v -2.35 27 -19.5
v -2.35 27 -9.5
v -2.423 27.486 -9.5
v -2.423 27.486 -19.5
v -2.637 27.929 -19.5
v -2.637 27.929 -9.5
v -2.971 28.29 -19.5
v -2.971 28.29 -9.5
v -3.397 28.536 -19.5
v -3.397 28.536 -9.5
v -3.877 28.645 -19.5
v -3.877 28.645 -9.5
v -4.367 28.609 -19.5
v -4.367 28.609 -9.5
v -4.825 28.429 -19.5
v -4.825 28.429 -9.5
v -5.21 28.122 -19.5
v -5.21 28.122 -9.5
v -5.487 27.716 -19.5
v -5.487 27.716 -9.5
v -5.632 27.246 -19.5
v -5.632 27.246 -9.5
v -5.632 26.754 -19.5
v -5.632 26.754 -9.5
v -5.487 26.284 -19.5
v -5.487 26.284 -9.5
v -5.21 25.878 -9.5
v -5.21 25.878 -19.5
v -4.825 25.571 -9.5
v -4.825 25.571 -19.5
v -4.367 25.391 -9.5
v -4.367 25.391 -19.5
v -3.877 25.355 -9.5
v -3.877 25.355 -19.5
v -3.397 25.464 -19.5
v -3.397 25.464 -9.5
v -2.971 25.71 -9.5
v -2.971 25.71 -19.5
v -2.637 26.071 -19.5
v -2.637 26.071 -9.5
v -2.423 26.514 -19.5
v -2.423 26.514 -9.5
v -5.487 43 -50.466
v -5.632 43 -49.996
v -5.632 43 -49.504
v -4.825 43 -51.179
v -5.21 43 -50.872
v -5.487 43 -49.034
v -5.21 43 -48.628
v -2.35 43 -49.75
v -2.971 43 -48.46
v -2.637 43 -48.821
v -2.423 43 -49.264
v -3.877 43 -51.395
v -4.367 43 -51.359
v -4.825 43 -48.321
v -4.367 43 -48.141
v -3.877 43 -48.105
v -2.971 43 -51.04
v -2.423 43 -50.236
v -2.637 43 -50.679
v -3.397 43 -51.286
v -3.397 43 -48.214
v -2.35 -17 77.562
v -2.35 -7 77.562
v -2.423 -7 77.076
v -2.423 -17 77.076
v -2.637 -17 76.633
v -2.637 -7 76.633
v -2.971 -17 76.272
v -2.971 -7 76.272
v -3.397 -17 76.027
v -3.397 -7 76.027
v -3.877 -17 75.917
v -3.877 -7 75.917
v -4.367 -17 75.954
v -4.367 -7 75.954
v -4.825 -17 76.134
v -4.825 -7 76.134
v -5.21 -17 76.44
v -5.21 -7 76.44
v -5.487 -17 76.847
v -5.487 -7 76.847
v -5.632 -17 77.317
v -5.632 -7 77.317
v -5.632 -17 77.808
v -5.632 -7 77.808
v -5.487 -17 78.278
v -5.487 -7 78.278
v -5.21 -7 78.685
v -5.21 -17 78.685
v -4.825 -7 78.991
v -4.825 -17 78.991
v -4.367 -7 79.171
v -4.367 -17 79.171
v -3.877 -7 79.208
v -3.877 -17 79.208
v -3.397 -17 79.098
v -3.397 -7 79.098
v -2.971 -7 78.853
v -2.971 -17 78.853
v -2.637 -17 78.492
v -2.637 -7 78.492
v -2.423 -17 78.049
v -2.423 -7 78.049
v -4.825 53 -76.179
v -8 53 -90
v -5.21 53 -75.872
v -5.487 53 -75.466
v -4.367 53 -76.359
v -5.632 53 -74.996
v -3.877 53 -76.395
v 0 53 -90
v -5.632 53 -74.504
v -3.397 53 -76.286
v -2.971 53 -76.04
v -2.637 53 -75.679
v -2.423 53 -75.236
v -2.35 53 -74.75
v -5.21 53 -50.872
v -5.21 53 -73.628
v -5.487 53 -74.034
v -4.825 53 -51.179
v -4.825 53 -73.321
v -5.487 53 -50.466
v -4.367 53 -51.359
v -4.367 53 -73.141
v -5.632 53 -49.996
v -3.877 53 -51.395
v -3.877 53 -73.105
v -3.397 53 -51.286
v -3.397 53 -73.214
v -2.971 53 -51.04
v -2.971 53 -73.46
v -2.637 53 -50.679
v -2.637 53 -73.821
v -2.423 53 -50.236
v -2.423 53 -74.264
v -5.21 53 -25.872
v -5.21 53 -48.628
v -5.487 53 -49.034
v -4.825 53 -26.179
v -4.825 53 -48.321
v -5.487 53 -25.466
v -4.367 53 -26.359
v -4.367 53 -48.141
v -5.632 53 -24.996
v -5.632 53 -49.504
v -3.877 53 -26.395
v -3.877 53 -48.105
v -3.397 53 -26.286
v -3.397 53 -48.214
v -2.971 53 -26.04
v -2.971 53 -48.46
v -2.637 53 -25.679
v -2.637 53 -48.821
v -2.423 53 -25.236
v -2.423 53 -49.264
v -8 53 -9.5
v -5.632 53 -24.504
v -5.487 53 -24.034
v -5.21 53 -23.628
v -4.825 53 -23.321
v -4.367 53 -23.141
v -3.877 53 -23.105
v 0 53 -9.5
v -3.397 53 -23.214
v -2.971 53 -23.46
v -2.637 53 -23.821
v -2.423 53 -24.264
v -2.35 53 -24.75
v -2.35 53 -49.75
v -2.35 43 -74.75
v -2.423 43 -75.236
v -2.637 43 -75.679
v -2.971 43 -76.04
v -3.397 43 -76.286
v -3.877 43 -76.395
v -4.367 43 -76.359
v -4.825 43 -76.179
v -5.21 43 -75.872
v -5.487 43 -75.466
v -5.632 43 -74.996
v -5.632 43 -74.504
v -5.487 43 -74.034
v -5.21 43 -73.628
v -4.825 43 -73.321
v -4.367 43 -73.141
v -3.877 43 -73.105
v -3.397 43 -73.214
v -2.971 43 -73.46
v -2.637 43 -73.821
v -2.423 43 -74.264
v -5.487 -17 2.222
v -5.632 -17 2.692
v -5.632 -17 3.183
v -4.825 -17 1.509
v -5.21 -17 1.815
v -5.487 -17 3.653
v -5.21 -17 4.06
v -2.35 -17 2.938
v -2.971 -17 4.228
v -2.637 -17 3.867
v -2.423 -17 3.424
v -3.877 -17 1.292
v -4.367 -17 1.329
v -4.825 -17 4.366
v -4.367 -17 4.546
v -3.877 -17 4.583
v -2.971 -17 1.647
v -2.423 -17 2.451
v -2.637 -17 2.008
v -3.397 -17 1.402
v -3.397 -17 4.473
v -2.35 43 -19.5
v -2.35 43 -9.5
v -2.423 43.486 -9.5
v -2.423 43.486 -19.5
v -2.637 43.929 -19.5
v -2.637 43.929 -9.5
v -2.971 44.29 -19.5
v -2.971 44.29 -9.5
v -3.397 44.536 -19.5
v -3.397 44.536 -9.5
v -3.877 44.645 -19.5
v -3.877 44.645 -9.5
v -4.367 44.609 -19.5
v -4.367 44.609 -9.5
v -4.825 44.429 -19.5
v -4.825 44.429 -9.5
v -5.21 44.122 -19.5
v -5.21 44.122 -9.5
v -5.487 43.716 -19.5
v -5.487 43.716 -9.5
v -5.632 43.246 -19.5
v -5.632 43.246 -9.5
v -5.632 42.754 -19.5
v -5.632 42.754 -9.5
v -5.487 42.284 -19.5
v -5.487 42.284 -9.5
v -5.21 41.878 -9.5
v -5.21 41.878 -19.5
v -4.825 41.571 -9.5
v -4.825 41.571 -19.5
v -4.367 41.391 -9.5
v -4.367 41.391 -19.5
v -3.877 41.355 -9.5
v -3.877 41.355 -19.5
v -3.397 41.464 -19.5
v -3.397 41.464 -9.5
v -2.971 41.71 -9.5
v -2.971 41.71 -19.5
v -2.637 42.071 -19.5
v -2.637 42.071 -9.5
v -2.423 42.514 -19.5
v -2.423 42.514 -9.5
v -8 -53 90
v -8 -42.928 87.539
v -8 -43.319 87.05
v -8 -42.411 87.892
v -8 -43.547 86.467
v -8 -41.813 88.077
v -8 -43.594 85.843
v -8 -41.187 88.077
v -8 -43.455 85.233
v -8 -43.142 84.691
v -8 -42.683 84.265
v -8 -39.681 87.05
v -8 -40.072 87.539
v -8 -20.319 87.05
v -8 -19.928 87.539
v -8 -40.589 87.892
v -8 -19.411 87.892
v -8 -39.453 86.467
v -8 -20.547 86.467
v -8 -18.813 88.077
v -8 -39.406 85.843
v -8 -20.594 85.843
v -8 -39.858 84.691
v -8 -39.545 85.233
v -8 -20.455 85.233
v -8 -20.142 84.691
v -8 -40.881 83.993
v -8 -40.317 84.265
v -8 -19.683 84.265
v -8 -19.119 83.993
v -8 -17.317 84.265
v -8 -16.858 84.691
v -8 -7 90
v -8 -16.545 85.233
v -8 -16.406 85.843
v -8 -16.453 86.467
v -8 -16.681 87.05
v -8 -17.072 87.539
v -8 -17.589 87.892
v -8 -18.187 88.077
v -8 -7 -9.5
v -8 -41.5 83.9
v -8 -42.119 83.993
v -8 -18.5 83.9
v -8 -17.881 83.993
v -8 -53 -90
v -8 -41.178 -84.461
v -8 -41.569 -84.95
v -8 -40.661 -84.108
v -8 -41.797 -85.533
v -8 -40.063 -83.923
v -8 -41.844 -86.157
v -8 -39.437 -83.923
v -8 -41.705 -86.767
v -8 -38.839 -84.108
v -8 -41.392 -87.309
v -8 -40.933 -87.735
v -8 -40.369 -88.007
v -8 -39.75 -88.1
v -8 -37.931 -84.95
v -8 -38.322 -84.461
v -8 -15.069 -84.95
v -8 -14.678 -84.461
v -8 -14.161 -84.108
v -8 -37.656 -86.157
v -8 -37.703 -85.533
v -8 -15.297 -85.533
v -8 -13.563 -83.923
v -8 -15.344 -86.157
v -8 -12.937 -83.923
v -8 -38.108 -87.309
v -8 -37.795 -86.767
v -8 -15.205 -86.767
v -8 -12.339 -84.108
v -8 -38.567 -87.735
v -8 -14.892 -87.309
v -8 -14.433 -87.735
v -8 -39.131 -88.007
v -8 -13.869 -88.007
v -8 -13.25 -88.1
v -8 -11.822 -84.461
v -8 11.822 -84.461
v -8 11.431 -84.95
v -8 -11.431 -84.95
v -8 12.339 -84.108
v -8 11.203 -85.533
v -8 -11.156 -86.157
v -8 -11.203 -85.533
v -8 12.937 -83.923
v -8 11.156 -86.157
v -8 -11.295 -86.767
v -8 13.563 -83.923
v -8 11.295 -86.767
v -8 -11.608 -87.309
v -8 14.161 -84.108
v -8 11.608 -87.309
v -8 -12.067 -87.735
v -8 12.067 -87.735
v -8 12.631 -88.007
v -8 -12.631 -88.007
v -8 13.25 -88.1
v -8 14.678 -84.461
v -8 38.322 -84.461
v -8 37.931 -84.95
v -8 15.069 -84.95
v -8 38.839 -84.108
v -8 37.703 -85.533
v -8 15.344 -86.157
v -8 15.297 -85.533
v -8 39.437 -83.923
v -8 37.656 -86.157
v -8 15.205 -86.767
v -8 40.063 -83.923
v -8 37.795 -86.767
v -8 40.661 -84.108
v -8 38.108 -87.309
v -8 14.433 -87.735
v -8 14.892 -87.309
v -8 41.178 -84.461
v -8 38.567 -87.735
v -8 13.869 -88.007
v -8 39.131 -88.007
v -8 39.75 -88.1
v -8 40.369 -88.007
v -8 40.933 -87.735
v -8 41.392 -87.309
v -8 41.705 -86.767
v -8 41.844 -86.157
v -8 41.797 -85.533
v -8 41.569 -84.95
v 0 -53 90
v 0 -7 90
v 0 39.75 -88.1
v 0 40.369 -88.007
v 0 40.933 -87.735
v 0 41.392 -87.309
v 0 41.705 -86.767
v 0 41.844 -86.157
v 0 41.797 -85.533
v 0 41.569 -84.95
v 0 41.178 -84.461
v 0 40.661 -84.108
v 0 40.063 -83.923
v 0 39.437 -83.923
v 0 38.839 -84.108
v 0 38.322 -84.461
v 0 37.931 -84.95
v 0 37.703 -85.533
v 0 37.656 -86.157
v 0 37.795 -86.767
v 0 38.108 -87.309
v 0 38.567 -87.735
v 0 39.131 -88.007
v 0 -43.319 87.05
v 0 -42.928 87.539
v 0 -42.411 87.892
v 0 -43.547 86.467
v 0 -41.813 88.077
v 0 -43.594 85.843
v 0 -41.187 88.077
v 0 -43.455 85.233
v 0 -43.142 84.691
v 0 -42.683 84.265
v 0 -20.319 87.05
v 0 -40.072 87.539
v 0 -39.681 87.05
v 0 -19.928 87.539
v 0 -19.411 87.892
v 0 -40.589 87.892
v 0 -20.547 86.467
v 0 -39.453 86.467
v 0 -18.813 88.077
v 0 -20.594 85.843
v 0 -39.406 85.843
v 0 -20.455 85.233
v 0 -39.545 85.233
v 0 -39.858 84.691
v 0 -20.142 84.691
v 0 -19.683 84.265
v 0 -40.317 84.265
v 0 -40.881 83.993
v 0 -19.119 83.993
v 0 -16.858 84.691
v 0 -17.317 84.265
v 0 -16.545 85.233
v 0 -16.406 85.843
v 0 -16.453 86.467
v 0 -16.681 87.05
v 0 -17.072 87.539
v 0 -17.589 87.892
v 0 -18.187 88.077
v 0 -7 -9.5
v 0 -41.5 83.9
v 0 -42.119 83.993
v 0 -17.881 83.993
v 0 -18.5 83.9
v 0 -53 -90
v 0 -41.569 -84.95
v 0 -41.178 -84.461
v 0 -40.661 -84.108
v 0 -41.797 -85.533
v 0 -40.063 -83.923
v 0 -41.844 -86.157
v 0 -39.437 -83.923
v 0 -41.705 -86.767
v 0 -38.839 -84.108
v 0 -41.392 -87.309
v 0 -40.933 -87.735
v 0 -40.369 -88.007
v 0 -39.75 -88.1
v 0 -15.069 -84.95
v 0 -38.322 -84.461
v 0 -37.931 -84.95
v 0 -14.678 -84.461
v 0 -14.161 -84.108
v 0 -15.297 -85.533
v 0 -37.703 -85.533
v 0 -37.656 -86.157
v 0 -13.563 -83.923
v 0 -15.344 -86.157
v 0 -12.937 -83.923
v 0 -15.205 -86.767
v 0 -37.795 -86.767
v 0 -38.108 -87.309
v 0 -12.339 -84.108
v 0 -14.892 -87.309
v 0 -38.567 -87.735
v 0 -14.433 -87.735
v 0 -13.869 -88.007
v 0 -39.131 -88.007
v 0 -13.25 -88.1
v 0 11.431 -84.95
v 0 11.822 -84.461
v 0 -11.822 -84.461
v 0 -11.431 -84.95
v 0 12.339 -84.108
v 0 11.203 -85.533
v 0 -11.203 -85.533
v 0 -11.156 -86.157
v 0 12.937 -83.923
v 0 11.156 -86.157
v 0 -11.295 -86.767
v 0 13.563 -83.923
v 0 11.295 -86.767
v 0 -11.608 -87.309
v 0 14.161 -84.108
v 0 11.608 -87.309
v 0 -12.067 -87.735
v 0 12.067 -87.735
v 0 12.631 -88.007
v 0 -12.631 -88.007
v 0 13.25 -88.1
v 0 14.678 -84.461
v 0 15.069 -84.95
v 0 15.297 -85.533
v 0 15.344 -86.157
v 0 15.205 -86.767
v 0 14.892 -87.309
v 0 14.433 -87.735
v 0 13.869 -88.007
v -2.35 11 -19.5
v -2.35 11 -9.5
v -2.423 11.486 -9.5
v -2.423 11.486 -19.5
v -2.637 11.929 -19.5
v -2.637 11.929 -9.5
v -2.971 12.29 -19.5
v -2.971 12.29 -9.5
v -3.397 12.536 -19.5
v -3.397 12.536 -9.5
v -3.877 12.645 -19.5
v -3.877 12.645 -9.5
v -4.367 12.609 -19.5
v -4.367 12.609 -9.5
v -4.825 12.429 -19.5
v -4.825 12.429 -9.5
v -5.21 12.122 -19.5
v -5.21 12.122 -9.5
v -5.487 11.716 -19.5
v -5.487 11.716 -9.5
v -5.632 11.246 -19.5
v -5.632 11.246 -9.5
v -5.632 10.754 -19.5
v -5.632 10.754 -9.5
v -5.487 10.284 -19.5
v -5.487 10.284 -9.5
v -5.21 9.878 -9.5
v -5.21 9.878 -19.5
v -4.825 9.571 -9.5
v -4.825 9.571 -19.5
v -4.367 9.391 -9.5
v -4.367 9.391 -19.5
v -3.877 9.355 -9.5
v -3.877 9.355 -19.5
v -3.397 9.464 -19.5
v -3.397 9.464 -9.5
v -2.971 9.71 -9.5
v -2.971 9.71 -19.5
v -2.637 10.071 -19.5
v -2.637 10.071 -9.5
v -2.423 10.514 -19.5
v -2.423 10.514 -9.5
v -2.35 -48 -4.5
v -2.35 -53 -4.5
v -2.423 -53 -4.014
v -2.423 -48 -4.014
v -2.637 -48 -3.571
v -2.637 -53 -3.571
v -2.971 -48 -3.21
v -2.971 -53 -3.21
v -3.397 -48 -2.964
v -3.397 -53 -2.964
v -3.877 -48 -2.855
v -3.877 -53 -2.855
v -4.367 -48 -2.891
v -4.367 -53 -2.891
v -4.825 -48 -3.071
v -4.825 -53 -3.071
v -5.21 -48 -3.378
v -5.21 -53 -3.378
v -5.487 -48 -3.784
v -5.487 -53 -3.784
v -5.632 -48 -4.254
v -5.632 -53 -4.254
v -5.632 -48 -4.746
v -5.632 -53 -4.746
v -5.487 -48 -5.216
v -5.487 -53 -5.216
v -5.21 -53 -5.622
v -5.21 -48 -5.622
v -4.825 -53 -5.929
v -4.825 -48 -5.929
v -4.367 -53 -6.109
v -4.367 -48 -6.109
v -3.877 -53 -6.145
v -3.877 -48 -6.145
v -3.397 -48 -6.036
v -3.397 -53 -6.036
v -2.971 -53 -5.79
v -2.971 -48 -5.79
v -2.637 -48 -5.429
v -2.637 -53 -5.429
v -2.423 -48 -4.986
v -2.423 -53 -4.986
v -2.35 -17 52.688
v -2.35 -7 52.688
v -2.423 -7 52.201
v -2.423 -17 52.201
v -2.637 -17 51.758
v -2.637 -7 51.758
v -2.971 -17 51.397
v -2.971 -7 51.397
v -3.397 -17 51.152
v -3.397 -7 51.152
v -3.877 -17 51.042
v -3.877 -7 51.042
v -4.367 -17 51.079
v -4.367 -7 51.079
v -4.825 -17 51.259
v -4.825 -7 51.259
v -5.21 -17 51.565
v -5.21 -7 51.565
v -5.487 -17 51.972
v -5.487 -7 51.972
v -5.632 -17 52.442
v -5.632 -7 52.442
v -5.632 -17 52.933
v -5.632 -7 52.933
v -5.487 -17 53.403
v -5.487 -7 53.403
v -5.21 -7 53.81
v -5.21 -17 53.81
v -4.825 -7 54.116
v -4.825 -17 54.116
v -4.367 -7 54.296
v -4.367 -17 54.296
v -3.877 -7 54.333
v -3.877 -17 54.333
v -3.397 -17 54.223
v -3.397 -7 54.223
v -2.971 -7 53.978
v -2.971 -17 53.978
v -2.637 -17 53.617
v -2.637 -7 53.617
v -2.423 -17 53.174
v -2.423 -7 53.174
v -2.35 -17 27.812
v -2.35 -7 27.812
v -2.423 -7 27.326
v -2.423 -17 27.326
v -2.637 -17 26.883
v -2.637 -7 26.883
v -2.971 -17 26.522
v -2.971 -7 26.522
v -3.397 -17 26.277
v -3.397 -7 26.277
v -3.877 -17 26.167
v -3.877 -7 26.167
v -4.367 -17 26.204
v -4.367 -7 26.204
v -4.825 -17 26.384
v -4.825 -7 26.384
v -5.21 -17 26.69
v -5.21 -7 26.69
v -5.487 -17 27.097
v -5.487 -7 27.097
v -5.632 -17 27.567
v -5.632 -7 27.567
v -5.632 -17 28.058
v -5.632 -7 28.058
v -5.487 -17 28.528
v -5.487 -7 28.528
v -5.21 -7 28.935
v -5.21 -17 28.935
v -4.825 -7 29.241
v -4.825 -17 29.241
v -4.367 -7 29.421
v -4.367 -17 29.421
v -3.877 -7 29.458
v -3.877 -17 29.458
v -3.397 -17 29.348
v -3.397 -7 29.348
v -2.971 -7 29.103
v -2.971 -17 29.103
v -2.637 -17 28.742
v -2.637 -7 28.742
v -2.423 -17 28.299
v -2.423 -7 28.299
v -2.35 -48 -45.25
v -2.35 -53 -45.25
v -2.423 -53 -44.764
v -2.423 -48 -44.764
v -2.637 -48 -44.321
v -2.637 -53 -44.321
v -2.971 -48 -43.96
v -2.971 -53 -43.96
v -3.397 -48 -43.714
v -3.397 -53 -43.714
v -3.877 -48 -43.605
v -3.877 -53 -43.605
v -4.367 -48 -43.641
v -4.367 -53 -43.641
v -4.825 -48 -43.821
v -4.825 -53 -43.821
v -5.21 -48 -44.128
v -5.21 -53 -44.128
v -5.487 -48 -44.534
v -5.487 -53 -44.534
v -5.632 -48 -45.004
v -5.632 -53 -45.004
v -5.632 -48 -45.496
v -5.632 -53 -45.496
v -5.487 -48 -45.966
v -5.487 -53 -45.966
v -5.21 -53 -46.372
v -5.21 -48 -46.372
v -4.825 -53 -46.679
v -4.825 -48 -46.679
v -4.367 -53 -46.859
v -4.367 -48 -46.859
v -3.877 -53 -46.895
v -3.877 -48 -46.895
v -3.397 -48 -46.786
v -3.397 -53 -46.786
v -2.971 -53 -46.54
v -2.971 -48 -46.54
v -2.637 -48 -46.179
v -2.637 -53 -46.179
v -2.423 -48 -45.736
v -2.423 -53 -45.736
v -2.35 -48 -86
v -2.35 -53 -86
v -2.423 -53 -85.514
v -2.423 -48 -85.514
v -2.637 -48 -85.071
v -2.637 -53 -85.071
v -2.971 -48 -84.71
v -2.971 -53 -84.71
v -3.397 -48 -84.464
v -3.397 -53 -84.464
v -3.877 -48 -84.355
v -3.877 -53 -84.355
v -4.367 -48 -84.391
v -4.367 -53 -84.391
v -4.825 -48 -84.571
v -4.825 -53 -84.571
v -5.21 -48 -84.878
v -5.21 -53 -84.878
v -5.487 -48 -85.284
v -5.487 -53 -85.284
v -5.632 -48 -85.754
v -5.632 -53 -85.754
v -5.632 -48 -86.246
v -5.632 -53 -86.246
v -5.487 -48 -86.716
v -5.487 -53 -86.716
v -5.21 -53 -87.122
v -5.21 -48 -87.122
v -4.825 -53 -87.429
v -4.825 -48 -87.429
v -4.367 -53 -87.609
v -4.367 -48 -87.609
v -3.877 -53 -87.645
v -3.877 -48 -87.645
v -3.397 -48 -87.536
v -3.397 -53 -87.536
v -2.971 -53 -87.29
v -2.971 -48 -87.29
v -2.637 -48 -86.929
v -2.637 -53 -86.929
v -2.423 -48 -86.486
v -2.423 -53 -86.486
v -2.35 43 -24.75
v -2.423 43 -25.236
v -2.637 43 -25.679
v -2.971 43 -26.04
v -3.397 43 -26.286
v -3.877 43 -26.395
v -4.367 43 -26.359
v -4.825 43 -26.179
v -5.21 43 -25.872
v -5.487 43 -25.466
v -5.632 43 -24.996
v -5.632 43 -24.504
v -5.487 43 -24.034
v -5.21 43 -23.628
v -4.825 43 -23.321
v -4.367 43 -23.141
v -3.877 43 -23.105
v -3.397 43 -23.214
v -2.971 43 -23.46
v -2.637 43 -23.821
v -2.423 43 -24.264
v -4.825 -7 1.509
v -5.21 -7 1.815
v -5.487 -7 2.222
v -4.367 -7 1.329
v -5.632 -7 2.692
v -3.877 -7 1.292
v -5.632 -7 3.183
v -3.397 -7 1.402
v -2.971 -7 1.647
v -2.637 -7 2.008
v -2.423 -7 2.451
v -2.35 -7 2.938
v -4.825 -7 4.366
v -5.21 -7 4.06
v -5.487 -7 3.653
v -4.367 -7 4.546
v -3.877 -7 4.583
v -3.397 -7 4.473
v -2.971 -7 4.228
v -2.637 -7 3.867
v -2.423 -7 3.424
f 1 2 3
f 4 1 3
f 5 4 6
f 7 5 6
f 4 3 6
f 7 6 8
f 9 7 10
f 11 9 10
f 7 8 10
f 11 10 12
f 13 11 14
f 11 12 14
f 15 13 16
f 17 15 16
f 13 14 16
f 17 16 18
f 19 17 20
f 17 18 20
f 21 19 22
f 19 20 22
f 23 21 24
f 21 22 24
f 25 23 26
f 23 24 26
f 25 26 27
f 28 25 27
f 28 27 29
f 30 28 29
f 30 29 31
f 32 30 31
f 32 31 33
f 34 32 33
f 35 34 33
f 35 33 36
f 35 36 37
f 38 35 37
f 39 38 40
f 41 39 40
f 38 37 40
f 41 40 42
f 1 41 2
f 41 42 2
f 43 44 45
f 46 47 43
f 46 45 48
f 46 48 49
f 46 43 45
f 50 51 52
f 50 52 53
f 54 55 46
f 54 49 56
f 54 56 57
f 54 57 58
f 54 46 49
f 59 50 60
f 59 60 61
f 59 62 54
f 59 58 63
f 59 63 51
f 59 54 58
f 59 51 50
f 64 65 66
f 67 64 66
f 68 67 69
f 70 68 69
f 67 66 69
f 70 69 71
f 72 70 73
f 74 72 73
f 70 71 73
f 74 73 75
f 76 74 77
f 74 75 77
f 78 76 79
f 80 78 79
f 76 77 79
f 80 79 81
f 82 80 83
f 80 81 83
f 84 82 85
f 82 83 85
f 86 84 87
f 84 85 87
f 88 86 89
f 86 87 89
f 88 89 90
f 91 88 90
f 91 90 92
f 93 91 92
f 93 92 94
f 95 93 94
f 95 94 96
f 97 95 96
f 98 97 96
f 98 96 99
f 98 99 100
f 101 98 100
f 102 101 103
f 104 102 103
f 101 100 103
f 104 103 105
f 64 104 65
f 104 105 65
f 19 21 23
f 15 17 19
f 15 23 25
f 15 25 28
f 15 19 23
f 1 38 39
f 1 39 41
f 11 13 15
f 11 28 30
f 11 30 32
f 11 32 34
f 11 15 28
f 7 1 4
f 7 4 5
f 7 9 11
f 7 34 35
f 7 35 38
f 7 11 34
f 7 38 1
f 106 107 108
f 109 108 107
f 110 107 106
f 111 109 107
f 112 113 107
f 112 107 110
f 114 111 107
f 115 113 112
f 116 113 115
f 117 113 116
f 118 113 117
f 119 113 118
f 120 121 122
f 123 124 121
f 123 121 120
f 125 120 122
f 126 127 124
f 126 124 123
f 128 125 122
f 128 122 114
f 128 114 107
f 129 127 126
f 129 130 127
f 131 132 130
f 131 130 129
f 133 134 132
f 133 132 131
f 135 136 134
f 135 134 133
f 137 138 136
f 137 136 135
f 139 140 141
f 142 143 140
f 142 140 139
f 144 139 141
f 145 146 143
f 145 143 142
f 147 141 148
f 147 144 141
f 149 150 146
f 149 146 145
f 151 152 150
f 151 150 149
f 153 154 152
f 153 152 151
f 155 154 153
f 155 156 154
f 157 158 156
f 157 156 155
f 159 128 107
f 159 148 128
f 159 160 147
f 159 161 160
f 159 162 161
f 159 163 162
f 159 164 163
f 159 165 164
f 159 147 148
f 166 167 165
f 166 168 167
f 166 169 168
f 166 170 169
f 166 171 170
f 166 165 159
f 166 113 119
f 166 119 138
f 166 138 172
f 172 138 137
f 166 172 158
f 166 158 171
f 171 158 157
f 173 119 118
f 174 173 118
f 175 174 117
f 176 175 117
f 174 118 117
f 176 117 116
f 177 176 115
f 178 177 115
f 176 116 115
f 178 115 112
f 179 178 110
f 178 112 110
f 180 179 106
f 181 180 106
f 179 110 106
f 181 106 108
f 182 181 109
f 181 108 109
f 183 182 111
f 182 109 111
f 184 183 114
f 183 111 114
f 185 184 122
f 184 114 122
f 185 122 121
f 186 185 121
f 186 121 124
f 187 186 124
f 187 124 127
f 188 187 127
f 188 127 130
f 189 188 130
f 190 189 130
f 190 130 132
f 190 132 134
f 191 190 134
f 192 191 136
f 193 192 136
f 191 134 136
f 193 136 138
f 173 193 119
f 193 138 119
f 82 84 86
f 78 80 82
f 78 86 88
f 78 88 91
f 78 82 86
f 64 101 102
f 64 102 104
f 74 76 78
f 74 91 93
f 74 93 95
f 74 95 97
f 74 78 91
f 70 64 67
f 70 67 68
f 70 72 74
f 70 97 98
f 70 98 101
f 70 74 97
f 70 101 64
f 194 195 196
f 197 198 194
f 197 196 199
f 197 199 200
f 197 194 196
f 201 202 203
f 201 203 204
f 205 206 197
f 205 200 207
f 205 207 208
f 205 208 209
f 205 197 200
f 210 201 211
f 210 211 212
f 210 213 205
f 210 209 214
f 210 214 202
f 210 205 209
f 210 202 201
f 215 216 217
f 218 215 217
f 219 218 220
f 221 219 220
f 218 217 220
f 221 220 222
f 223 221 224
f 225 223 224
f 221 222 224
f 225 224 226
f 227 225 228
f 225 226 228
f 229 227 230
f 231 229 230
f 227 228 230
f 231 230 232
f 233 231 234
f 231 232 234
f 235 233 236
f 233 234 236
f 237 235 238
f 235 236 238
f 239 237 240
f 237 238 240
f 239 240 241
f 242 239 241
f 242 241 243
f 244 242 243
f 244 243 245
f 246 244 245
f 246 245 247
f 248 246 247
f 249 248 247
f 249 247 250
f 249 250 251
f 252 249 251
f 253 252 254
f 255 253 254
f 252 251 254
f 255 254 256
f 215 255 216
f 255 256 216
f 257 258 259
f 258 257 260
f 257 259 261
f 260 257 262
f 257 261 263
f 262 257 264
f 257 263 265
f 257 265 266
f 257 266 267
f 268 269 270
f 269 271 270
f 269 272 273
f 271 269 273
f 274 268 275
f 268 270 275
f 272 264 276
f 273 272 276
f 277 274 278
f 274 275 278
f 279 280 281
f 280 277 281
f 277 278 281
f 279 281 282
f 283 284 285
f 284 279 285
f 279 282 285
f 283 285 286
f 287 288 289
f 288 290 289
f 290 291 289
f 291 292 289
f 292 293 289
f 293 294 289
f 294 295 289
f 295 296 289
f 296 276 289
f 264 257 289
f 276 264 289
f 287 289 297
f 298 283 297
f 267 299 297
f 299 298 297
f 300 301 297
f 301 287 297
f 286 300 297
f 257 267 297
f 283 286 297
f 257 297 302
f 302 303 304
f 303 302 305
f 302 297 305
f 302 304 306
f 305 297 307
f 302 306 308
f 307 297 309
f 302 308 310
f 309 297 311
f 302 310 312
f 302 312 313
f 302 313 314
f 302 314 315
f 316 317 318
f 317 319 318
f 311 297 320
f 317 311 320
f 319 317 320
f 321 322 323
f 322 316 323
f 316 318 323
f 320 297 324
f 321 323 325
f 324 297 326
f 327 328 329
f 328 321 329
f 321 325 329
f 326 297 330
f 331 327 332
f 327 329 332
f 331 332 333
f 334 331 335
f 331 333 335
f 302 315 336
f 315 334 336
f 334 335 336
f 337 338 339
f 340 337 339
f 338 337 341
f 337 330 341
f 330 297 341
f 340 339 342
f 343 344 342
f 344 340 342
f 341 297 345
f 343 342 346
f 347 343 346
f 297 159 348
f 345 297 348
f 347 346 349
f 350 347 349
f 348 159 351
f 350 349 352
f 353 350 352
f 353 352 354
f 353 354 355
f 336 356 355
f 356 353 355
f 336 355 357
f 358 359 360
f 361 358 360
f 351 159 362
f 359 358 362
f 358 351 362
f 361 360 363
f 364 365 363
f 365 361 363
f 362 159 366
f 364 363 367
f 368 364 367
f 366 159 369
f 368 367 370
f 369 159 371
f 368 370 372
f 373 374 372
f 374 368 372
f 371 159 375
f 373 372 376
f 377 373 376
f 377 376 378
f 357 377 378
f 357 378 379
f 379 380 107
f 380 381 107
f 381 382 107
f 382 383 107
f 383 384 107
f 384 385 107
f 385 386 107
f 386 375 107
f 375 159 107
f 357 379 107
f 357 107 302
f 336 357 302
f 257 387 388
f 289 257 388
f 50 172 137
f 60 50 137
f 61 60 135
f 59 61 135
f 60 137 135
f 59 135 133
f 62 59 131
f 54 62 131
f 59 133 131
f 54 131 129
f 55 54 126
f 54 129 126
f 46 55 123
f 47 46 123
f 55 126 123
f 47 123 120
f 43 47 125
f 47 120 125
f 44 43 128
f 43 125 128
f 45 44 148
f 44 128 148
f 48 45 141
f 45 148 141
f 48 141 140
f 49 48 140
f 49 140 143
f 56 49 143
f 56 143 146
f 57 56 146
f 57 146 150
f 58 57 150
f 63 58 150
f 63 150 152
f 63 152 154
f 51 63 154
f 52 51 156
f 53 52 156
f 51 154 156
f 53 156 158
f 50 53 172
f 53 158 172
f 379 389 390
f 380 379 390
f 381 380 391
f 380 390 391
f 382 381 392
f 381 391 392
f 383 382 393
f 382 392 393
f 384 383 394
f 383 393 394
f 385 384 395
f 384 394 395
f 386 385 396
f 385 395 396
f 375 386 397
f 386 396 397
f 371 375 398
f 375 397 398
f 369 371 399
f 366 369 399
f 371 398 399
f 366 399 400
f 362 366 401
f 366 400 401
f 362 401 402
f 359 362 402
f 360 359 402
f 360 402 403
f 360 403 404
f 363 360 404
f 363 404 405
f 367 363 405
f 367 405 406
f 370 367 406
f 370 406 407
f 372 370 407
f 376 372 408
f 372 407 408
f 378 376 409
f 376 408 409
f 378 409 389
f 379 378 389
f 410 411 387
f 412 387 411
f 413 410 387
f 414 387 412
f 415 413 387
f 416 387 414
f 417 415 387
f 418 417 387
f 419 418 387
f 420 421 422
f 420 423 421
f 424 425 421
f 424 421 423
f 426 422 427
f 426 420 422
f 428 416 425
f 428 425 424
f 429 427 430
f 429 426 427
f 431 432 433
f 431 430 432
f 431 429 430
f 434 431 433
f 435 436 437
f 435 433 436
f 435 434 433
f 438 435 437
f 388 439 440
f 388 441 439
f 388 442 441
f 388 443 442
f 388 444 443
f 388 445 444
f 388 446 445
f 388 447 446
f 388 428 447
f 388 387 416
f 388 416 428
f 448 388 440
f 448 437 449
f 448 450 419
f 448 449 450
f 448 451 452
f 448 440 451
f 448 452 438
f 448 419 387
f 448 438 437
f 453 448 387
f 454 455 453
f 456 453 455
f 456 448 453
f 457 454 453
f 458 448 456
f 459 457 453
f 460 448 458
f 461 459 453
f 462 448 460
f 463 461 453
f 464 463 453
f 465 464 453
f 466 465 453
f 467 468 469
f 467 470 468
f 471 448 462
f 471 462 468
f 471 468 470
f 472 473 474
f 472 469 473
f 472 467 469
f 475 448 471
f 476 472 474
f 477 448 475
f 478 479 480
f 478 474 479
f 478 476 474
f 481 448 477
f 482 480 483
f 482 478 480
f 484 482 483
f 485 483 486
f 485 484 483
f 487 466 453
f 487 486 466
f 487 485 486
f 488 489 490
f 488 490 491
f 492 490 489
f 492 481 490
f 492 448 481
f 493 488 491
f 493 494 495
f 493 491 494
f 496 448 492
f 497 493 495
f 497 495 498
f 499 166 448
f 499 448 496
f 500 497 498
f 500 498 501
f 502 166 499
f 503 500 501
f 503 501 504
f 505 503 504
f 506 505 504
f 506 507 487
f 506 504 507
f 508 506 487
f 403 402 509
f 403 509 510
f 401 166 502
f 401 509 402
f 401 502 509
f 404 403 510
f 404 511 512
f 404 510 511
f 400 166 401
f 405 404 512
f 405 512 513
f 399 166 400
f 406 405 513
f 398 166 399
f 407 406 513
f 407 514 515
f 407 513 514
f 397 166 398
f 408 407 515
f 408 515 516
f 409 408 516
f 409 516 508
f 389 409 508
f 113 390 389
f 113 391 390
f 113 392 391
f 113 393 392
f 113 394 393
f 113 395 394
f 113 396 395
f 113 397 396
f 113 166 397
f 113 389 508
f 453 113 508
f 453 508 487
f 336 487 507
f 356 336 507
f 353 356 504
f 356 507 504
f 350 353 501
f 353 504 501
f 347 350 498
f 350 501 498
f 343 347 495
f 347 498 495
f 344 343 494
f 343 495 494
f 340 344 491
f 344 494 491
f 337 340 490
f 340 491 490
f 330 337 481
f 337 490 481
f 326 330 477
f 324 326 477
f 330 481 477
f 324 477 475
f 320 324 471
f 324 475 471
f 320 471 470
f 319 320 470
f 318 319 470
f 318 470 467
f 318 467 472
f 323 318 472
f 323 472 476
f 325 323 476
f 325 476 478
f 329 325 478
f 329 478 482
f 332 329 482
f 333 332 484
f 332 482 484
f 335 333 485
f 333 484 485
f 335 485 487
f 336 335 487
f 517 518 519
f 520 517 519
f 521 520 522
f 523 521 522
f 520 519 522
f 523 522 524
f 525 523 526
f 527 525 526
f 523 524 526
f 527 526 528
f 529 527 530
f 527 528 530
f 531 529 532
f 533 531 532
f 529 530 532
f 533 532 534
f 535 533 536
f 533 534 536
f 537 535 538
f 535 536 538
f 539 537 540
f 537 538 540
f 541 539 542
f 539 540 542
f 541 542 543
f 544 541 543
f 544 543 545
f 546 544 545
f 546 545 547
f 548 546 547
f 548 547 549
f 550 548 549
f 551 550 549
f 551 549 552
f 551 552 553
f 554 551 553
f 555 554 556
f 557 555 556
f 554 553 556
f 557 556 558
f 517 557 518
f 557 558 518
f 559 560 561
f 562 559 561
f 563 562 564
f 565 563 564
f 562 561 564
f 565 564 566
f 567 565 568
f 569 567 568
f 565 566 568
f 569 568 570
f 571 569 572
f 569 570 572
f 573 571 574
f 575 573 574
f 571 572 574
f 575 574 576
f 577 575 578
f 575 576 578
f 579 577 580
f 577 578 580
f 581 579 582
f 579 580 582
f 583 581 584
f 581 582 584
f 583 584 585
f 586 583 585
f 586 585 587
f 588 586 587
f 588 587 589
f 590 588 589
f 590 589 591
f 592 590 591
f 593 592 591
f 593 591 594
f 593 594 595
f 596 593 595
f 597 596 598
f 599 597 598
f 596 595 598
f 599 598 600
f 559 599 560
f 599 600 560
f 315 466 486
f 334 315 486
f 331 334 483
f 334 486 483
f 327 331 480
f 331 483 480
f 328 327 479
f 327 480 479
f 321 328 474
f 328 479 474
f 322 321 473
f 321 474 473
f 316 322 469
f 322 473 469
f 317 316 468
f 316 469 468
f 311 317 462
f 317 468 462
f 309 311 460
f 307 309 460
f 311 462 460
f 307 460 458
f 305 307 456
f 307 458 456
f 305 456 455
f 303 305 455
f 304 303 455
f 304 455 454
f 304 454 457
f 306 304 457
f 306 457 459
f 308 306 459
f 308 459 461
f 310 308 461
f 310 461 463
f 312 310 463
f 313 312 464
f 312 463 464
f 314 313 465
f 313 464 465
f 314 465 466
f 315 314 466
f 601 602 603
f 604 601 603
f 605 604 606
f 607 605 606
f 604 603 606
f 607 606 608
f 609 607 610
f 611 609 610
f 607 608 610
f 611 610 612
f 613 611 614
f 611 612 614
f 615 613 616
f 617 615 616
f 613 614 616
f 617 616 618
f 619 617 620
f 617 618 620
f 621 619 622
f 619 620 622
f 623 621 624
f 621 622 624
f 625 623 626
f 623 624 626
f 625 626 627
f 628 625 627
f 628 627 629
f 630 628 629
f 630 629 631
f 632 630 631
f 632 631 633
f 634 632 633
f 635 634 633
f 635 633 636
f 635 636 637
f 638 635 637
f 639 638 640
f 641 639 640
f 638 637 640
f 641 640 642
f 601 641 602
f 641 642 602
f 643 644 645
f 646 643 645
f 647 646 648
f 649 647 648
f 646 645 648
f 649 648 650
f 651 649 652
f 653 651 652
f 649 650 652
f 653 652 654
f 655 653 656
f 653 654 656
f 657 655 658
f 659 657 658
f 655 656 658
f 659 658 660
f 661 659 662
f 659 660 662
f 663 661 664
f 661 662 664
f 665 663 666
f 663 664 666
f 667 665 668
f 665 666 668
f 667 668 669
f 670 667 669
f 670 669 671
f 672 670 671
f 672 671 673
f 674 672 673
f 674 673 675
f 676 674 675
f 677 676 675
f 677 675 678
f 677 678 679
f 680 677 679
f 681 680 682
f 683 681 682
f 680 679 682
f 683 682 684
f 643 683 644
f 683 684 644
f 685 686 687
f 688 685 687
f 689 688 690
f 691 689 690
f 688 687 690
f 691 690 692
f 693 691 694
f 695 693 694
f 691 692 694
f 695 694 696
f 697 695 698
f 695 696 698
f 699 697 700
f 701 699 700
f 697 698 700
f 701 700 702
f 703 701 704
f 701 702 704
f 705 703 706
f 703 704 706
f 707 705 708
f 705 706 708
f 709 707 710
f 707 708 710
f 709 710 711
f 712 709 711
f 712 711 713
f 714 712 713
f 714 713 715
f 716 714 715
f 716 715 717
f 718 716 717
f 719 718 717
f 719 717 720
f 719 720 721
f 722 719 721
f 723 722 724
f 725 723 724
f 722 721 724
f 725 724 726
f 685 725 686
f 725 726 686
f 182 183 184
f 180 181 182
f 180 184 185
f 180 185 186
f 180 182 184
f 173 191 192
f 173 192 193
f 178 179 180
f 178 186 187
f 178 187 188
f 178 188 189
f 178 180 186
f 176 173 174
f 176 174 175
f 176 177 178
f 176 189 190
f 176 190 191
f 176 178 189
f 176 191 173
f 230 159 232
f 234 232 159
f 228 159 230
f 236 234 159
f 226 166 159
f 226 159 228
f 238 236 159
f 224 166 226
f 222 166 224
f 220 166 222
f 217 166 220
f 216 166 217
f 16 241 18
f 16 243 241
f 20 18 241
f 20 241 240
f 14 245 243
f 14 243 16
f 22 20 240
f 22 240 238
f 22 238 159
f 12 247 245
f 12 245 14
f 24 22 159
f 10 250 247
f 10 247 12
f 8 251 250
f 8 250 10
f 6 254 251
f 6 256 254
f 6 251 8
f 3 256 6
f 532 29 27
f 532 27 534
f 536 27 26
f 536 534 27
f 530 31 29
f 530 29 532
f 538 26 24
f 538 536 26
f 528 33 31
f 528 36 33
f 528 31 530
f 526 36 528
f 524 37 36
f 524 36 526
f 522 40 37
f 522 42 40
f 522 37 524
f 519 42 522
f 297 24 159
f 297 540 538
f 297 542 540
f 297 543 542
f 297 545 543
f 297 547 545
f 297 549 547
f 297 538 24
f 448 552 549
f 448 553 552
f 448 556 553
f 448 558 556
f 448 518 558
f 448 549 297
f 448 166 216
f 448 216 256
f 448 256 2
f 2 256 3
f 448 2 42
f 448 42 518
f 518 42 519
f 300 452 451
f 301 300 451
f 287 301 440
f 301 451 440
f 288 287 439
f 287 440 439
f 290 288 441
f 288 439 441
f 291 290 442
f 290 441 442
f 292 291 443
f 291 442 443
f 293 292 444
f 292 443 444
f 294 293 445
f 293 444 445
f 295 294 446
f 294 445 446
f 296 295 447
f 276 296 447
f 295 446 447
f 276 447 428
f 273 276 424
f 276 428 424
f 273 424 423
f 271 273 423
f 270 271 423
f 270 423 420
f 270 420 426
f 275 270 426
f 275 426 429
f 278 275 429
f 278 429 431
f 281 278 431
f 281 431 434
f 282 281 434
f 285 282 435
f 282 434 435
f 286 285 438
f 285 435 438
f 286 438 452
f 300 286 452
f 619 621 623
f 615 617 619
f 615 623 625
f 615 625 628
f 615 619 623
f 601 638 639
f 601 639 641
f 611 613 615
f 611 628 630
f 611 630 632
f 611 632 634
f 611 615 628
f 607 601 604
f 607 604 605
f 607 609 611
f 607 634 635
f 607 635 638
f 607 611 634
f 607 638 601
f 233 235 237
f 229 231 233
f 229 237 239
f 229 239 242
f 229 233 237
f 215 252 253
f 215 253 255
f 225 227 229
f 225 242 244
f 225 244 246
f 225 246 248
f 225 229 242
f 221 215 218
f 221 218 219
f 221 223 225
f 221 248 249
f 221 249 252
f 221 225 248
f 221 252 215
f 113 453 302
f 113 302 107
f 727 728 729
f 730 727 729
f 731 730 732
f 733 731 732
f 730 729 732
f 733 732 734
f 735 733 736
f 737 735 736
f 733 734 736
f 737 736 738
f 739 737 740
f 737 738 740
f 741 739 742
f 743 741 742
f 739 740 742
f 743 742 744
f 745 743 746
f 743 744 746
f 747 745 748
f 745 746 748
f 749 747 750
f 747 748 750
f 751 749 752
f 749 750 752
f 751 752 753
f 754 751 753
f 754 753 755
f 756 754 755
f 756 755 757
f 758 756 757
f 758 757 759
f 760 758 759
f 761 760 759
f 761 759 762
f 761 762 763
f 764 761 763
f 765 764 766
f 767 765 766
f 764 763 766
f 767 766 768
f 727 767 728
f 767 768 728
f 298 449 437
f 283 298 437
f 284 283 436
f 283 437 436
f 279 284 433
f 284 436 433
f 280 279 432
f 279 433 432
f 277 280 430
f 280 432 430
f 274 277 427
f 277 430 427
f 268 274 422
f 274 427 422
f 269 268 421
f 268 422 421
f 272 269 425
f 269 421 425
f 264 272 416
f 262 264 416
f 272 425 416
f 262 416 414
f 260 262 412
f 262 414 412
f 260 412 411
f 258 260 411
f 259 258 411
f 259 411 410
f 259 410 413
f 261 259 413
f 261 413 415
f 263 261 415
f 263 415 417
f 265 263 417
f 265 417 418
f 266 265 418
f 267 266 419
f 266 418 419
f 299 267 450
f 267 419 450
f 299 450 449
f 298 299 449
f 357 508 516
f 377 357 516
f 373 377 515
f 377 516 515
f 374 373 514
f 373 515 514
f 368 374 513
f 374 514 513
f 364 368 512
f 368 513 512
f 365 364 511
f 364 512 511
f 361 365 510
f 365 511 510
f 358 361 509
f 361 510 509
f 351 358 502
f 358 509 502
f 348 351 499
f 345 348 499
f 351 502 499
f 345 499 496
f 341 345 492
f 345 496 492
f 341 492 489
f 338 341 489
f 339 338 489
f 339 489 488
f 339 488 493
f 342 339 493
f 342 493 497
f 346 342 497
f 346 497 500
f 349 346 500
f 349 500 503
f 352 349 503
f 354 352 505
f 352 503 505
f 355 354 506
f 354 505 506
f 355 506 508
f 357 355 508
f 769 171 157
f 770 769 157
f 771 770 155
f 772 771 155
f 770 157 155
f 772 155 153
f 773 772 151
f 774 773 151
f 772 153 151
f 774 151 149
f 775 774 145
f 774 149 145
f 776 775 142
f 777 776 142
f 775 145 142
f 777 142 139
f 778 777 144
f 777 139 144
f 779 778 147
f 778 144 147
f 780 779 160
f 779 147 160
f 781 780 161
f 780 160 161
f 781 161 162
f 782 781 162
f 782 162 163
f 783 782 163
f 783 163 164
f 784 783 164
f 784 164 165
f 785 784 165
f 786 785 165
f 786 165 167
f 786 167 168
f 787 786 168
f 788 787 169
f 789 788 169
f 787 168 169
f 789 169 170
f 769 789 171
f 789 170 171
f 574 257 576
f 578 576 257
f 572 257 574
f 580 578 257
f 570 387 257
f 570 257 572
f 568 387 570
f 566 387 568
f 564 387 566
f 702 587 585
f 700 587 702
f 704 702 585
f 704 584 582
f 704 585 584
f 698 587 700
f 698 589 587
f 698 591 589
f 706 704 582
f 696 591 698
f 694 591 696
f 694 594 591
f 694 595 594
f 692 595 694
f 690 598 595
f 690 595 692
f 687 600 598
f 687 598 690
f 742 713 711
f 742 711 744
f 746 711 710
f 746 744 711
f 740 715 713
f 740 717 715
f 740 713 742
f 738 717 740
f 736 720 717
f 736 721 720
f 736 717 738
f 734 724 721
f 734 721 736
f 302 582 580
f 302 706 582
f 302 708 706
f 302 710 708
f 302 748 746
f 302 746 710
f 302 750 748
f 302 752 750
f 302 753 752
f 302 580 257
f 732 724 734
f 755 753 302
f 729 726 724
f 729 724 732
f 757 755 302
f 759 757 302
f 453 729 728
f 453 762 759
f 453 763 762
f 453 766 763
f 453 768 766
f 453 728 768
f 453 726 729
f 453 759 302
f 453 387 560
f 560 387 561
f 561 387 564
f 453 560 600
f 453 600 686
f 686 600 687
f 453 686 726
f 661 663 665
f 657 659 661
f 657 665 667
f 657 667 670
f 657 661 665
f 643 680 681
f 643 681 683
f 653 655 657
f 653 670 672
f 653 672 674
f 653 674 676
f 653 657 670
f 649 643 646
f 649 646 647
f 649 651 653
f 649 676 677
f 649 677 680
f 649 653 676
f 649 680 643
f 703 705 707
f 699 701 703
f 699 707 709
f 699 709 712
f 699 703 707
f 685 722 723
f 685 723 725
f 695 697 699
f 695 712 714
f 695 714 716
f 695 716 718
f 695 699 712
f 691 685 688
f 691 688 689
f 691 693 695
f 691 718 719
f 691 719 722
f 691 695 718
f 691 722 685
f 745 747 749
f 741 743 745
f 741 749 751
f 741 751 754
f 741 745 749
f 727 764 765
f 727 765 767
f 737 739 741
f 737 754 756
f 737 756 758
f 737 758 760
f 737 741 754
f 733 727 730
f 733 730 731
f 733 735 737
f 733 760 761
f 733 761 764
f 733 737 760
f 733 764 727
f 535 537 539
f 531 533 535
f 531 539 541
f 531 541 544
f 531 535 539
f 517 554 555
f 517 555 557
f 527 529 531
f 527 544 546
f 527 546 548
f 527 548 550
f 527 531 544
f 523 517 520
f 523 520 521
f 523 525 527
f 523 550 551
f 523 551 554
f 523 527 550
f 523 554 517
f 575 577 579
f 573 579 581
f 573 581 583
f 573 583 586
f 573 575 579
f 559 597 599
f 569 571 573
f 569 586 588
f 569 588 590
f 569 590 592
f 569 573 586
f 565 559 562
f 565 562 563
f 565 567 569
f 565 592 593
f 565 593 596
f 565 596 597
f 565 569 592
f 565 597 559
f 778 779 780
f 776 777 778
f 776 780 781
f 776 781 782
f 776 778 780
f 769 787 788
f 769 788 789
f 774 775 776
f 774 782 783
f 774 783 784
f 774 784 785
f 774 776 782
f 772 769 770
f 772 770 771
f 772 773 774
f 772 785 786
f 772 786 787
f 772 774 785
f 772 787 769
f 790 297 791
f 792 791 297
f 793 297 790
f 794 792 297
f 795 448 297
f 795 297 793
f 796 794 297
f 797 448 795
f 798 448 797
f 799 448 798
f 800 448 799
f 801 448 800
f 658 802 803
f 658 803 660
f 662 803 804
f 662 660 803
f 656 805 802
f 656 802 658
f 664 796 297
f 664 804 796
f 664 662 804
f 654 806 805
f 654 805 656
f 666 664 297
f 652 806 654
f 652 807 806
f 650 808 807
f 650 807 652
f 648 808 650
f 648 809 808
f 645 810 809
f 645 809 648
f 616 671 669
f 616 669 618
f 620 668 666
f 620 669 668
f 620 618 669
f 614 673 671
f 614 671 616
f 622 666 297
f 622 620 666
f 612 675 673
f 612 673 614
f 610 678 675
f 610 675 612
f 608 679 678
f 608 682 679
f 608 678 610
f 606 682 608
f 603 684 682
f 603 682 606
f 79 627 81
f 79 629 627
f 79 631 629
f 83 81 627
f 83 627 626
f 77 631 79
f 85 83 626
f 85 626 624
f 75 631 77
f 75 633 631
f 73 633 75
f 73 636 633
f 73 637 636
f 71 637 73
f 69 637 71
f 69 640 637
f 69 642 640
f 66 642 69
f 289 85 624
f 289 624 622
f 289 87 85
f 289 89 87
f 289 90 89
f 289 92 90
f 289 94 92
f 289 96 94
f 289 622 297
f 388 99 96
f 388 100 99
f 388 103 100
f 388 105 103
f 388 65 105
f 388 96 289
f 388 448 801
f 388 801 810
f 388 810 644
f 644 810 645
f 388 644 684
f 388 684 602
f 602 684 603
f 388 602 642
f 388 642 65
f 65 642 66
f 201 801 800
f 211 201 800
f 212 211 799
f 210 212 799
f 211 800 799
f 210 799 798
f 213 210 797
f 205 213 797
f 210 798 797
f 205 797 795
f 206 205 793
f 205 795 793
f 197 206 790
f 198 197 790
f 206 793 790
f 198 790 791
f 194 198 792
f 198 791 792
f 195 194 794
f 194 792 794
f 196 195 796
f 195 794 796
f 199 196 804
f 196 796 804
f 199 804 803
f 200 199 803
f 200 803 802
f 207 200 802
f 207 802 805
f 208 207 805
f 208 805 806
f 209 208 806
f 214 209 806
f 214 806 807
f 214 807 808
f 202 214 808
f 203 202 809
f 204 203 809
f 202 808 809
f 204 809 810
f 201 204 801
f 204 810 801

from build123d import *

# Parameters (mm, degrees)
SKETCH1_W           = 8
SKETCH1_H           = 46
SKETCH1_R           = 2.1
SKETCH1_H_2         = 106
BOSS_EXTRUDE1_DEPTH = 8
SKETCH2_R           = 1.65
CUT_EXTRUDE1_DEPTH  = 5
SKETCH3_R           = 1.65
CUT_EXTRUDE2_DEPTH  = 10
SKETCH4_R           = 1.65
CUT_EXTRUDE3_DEPTH  = 10
SKETCH5_R           = 1.65
CUT_EXTRUDE4_DEPTH  = 10


with BuildPart() as part:
    # Sketch1 → Boss-Extrude1 (new body)
    with BuildSketch(Plane(origin=(0, 0, 0), x_dir=(0, 0, -1), z_dir=(1, 0, 0))):
        with Locations((-86, -30)):
            Rectangle(SKETCH1_W, SKETCH1_H)
        with Locations((-86, -41.5)):
            Circle(SKETCH1_R, mode=Mode.SUBTRACT)
        with Locations((-86, -18.5)):
            Circle(SKETCH1_R, mode=Mode.SUBTRACT)
        Polygon((82, 53), (9.5, 53), (9.5, -7), (-82, -7), (-82, -53), (82, -53), align=None)
        with Locations((86, 0)):
            Rectangle(SKETCH1_W, SKETCH1_H_2)
        with Locations((86, -39.75)):
            Circle(SKETCH1_R, mode=Mode.SUBTRACT)
        with Locations((86, -13.25)):
            Circle(SKETCH1_R, mode=Mode.SUBTRACT)
        with Locations((86, 13.25)):
            Circle(SKETCH1_R, mode=Mode.SUBTRACT)
        with Locations((86, 39.75)):
            Circle(SKETCH1_R, mode=Mode.SUBTRACT)
    extrude(amount=-BOSS_EXTRUDE1_DEPTH)

    # Sketch2 → Cut-Extrude1 (cut)
    with BuildSketch(Plane.XZ.offset(53)):
        with Locations((-4, -86)):
            Circle(SKETCH2_R)
        with Locations((-4, -4.5)):
            Circle(SKETCH2_R)
        with Locations((-4, -45.25)):
            Circle(SKETCH2_R)
    extrude(amount=-CUT_EXTRUDE1_DEPTH, mode=Mode.SUBTRACT)

    # Sketch3 → Cut-Extrude2 (cut)
    with BuildSketch(Plane(origin=(0, 53, 0), x_dir=(1, 0, 0), z_dir=(0, 1, 0))):
        with Locations((-4, 49.75)):
            Circle(SKETCH3_R)
        with Locations((-4, 74.75)):
            Circle(SKETCH3_R)
        with Locations((-4, 24.75)):
            Circle(SKETCH3_R)
    extrude(amount=-CUT_EXTRUDE2_DEPTH, mode=Mode.SUBTRACT)

    # Sketch4 → Cut-Extrude3 (cut)
    with BuildSketch(Plane(origin=(0, -7, 0), x_dir=(1, 0, 0), z_dir=(0, 1, 0))):
        with Locations((-4, -2.9375)):
            Circle(SKETCH4_R)
        with Locations((-4, -27.8125)):
            Circle(SKETCH4_R)
        with Locations((-4, -52.6875)):
            Circle(SKETCH4_R)
        with Locations((-4, -77.5625)):
            Circle(SKETCH4_R)
    extrude(amount=-CUT_EXTRUDE3_DEPTH, mode=Mode.SUBTRACT)

    # Sketch5 → Cut-Extrude4 (cut)
    with BuildSketch(Plane.XY.offset(-9.5)):
        with Locations((-4, 11)):
            Circle(SKETCH5_R)
        with Locations((-4, 43)):
            Circle(SKETCH5_R)
        with Locations((-4, 27)):
            Circle(SKETCH5_R)
    extrude(amount=-CUT_EXTRUDE4_DEPTH, mode=Mode.SUBTRACT)


solid = part.part
